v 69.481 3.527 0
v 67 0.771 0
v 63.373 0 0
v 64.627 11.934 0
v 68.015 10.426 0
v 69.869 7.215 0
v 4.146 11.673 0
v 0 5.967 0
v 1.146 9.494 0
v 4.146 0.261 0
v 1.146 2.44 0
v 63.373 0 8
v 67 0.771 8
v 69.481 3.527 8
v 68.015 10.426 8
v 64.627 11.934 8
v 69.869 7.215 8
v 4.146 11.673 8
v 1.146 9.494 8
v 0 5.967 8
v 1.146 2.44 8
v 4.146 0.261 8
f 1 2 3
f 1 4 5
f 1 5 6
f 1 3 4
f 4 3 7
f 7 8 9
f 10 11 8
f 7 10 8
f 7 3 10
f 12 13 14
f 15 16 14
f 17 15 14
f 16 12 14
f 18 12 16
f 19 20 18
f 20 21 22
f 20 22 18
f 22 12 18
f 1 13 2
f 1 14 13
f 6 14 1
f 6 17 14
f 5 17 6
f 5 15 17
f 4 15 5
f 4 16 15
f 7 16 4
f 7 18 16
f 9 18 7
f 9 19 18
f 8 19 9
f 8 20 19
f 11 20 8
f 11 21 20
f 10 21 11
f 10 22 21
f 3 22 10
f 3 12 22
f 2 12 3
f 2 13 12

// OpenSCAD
$fn = 32;

// ----------------------------------------------------------------------
// Key bar: parallel key, 8 mm thick
// ----------------------------------------------------------------------

// --- parameters (mm) ---
profile_height = 8;       // extrusion height
profile_points = 11;      // points of the closed outline

profile = [[0, 5.967], [1.146, 2.44], [4.146, 0.261], [63.373, 0], [67, 0.771], [69.481, 3.527], [69.869, 7.215], [68.015, 10.426], [64.627, 11.934], [4.146, 11.673], [1.146, 9.494]];  // single closed polygon, 11 points, counter clockwise

// --- the one profile operation ---
linear_extrude(height = profile_height) polygon(points = profile);
